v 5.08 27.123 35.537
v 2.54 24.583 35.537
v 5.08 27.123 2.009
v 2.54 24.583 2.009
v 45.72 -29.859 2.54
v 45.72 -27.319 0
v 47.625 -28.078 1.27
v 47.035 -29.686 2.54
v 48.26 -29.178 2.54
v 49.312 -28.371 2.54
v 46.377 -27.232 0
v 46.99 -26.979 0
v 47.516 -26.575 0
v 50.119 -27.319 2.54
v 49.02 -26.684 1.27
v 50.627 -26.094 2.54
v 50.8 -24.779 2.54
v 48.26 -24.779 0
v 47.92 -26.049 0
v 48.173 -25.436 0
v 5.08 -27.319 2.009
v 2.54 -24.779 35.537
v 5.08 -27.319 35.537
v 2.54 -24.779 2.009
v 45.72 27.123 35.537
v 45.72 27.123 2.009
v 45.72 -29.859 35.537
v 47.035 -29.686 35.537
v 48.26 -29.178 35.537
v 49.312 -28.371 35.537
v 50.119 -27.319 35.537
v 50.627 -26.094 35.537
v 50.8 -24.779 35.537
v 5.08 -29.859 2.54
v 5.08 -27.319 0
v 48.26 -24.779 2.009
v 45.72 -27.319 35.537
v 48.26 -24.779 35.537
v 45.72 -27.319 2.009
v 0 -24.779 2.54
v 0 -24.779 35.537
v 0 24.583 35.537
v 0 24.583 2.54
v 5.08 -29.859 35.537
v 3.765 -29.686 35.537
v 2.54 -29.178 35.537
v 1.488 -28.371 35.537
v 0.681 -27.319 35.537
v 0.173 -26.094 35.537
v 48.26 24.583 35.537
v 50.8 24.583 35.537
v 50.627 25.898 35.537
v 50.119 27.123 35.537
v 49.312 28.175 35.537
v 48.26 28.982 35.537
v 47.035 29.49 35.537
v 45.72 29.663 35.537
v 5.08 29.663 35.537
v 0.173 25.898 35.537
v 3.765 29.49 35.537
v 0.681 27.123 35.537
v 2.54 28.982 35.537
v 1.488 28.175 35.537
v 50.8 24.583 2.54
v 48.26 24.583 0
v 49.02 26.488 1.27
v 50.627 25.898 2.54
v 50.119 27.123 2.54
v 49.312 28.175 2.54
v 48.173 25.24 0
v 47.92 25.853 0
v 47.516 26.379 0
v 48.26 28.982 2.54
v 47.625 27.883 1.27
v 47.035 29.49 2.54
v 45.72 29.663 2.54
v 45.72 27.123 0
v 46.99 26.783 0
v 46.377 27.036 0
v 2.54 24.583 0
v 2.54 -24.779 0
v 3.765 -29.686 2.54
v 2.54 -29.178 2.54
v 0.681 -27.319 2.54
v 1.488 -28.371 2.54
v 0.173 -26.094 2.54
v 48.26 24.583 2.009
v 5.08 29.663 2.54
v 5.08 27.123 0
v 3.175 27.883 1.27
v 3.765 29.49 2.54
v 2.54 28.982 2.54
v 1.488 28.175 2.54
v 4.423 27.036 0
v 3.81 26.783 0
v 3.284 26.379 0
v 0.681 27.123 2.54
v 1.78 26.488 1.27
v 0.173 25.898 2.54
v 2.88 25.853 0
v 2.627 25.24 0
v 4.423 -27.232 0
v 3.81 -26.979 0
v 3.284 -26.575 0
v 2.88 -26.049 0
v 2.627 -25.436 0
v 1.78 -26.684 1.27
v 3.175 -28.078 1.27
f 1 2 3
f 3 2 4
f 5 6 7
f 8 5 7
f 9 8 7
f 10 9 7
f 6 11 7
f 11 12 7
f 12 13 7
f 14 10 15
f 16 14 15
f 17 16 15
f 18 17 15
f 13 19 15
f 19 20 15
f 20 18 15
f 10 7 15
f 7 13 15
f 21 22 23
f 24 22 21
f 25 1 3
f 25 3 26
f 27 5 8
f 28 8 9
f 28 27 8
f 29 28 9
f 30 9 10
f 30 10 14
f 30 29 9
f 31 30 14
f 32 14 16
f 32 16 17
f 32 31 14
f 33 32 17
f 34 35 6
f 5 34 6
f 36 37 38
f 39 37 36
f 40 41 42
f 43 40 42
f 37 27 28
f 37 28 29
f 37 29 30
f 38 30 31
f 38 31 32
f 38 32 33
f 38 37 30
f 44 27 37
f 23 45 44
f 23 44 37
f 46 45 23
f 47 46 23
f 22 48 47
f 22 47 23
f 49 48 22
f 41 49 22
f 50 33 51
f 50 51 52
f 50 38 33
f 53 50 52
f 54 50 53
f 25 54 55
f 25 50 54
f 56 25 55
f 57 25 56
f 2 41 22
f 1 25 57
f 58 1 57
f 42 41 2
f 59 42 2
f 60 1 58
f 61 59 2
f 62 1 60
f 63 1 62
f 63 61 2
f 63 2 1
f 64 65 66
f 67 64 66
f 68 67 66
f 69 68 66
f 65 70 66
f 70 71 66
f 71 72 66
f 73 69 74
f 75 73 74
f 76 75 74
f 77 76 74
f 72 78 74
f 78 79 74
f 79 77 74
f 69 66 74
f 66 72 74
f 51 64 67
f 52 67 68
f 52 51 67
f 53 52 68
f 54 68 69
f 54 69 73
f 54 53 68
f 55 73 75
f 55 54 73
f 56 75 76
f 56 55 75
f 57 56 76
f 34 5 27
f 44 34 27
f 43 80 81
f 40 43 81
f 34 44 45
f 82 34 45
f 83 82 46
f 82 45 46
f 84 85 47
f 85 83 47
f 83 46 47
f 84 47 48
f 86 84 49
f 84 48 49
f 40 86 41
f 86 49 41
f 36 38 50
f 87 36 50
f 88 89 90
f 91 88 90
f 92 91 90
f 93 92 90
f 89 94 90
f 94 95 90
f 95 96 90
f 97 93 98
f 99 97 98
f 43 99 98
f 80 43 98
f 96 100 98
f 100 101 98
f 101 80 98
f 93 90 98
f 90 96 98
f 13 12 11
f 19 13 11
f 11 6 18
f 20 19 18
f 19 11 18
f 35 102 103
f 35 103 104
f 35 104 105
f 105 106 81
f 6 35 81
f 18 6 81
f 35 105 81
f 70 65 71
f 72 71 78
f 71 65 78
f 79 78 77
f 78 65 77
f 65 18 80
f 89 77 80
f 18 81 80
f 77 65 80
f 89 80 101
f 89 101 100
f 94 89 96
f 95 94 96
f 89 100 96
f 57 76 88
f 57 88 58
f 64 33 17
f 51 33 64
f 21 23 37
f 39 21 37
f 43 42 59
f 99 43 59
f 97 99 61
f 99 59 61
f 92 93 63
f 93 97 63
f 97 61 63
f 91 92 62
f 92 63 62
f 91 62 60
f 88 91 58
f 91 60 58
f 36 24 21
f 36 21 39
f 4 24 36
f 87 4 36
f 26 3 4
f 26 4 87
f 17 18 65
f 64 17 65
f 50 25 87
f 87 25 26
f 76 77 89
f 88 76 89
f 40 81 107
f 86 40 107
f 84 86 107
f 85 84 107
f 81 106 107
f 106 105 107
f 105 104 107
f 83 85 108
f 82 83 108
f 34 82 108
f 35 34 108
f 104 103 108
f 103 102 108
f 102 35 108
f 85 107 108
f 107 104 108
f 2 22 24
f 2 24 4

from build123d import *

# Parameters (mm, degrees)
F0_W     = 59.521824
F0_H     = 35.536878
F1_DEPTH = 50.8
F2_W     = 45.72
F2_H     = 54.441824
F3_DEPTH = 33.528
F4_R     = 5.08
F5_R     = 5.08
F6_R     = 5.08
F7_SIZE  = 2.54
F8_SIZE  = 2.54
F9_SIZE  = 2.54


with BuildPart() as f1:
    # F0 (on Right) → F1 (new body)
    with BuildSketch(Plane.YZ):
        with Locations((-0.097901, 17.768439)):
            Rectangle(F0_W, F0_H)
    extrude(amount=F1_DEPTH)

    # F2 (on face) → F3 (cut)
    with BuildSketch(Plane.XY.offset(35.536878)):
        with Locations((25.4, -0.097901)):
            Rectangle(F2_W, F2_H)
    extrude(amount=-F3_DEPTH, mode=Mode.SUBTRACT)

    # F4
    f4_edges = [f1.edges().sort_by_distance(p)[0] for p in [
        (0, 29.663011, 17.768439),
        (0, -29.858813, 17.768439),
    ]]
    fillet(f4_edges, radius=F4_R)

    # F5
    f5_edges = [f1.edges().sort_by_distance(p)[0] for p in [
        (50.8, -29.858813, 17.768439),
    ]]
    fillet(f5_edges, radius=F5_R)

    # F6
    f6_edges = [f1.edges().sort_by_distance(p)[0] for p in [
        (50.8, 29.663011, 17.768439),
    ]]
    fillet(f6_edges, radius=F6_R)

    # F7
    f7_edges = [f1.edges().sort_by_distance(p)[0] for p in [
        (48.26, 27.123011, 18.772878),
        (2.54, 27.123011, 18.772878),
    ]]
    chamfer(f7_edges, length=F7_SIZE)

    # F8
    f8_edges = [f1.edges().sort_by_distance(p)[0] for p in [
        (48.26, -27.318813, 18.772878),
        (2.54, -27.318813, 18.772878),
    ]]
    chamfer(f8_edges, length=F8_SIZE)

    # F9
    f9_edges = [f1.edges().sort_by_distance(p)[0] for p in [
        (50.8, -0.097901, 0),
        (49.312102, 28.175114, 0),
        (49.312102, -28.370915, 0),
        (25.4, 29.663011, 0),
        (25.4, -29.858813, 0),
        (1.487898, 28.175114, 0),
        (1.487898, -28.370915, 0),
        (0, -0.097901, 0),
    ]]
    chamfer(f9_edges, length=F9_SIZE)


solid = f1.part
